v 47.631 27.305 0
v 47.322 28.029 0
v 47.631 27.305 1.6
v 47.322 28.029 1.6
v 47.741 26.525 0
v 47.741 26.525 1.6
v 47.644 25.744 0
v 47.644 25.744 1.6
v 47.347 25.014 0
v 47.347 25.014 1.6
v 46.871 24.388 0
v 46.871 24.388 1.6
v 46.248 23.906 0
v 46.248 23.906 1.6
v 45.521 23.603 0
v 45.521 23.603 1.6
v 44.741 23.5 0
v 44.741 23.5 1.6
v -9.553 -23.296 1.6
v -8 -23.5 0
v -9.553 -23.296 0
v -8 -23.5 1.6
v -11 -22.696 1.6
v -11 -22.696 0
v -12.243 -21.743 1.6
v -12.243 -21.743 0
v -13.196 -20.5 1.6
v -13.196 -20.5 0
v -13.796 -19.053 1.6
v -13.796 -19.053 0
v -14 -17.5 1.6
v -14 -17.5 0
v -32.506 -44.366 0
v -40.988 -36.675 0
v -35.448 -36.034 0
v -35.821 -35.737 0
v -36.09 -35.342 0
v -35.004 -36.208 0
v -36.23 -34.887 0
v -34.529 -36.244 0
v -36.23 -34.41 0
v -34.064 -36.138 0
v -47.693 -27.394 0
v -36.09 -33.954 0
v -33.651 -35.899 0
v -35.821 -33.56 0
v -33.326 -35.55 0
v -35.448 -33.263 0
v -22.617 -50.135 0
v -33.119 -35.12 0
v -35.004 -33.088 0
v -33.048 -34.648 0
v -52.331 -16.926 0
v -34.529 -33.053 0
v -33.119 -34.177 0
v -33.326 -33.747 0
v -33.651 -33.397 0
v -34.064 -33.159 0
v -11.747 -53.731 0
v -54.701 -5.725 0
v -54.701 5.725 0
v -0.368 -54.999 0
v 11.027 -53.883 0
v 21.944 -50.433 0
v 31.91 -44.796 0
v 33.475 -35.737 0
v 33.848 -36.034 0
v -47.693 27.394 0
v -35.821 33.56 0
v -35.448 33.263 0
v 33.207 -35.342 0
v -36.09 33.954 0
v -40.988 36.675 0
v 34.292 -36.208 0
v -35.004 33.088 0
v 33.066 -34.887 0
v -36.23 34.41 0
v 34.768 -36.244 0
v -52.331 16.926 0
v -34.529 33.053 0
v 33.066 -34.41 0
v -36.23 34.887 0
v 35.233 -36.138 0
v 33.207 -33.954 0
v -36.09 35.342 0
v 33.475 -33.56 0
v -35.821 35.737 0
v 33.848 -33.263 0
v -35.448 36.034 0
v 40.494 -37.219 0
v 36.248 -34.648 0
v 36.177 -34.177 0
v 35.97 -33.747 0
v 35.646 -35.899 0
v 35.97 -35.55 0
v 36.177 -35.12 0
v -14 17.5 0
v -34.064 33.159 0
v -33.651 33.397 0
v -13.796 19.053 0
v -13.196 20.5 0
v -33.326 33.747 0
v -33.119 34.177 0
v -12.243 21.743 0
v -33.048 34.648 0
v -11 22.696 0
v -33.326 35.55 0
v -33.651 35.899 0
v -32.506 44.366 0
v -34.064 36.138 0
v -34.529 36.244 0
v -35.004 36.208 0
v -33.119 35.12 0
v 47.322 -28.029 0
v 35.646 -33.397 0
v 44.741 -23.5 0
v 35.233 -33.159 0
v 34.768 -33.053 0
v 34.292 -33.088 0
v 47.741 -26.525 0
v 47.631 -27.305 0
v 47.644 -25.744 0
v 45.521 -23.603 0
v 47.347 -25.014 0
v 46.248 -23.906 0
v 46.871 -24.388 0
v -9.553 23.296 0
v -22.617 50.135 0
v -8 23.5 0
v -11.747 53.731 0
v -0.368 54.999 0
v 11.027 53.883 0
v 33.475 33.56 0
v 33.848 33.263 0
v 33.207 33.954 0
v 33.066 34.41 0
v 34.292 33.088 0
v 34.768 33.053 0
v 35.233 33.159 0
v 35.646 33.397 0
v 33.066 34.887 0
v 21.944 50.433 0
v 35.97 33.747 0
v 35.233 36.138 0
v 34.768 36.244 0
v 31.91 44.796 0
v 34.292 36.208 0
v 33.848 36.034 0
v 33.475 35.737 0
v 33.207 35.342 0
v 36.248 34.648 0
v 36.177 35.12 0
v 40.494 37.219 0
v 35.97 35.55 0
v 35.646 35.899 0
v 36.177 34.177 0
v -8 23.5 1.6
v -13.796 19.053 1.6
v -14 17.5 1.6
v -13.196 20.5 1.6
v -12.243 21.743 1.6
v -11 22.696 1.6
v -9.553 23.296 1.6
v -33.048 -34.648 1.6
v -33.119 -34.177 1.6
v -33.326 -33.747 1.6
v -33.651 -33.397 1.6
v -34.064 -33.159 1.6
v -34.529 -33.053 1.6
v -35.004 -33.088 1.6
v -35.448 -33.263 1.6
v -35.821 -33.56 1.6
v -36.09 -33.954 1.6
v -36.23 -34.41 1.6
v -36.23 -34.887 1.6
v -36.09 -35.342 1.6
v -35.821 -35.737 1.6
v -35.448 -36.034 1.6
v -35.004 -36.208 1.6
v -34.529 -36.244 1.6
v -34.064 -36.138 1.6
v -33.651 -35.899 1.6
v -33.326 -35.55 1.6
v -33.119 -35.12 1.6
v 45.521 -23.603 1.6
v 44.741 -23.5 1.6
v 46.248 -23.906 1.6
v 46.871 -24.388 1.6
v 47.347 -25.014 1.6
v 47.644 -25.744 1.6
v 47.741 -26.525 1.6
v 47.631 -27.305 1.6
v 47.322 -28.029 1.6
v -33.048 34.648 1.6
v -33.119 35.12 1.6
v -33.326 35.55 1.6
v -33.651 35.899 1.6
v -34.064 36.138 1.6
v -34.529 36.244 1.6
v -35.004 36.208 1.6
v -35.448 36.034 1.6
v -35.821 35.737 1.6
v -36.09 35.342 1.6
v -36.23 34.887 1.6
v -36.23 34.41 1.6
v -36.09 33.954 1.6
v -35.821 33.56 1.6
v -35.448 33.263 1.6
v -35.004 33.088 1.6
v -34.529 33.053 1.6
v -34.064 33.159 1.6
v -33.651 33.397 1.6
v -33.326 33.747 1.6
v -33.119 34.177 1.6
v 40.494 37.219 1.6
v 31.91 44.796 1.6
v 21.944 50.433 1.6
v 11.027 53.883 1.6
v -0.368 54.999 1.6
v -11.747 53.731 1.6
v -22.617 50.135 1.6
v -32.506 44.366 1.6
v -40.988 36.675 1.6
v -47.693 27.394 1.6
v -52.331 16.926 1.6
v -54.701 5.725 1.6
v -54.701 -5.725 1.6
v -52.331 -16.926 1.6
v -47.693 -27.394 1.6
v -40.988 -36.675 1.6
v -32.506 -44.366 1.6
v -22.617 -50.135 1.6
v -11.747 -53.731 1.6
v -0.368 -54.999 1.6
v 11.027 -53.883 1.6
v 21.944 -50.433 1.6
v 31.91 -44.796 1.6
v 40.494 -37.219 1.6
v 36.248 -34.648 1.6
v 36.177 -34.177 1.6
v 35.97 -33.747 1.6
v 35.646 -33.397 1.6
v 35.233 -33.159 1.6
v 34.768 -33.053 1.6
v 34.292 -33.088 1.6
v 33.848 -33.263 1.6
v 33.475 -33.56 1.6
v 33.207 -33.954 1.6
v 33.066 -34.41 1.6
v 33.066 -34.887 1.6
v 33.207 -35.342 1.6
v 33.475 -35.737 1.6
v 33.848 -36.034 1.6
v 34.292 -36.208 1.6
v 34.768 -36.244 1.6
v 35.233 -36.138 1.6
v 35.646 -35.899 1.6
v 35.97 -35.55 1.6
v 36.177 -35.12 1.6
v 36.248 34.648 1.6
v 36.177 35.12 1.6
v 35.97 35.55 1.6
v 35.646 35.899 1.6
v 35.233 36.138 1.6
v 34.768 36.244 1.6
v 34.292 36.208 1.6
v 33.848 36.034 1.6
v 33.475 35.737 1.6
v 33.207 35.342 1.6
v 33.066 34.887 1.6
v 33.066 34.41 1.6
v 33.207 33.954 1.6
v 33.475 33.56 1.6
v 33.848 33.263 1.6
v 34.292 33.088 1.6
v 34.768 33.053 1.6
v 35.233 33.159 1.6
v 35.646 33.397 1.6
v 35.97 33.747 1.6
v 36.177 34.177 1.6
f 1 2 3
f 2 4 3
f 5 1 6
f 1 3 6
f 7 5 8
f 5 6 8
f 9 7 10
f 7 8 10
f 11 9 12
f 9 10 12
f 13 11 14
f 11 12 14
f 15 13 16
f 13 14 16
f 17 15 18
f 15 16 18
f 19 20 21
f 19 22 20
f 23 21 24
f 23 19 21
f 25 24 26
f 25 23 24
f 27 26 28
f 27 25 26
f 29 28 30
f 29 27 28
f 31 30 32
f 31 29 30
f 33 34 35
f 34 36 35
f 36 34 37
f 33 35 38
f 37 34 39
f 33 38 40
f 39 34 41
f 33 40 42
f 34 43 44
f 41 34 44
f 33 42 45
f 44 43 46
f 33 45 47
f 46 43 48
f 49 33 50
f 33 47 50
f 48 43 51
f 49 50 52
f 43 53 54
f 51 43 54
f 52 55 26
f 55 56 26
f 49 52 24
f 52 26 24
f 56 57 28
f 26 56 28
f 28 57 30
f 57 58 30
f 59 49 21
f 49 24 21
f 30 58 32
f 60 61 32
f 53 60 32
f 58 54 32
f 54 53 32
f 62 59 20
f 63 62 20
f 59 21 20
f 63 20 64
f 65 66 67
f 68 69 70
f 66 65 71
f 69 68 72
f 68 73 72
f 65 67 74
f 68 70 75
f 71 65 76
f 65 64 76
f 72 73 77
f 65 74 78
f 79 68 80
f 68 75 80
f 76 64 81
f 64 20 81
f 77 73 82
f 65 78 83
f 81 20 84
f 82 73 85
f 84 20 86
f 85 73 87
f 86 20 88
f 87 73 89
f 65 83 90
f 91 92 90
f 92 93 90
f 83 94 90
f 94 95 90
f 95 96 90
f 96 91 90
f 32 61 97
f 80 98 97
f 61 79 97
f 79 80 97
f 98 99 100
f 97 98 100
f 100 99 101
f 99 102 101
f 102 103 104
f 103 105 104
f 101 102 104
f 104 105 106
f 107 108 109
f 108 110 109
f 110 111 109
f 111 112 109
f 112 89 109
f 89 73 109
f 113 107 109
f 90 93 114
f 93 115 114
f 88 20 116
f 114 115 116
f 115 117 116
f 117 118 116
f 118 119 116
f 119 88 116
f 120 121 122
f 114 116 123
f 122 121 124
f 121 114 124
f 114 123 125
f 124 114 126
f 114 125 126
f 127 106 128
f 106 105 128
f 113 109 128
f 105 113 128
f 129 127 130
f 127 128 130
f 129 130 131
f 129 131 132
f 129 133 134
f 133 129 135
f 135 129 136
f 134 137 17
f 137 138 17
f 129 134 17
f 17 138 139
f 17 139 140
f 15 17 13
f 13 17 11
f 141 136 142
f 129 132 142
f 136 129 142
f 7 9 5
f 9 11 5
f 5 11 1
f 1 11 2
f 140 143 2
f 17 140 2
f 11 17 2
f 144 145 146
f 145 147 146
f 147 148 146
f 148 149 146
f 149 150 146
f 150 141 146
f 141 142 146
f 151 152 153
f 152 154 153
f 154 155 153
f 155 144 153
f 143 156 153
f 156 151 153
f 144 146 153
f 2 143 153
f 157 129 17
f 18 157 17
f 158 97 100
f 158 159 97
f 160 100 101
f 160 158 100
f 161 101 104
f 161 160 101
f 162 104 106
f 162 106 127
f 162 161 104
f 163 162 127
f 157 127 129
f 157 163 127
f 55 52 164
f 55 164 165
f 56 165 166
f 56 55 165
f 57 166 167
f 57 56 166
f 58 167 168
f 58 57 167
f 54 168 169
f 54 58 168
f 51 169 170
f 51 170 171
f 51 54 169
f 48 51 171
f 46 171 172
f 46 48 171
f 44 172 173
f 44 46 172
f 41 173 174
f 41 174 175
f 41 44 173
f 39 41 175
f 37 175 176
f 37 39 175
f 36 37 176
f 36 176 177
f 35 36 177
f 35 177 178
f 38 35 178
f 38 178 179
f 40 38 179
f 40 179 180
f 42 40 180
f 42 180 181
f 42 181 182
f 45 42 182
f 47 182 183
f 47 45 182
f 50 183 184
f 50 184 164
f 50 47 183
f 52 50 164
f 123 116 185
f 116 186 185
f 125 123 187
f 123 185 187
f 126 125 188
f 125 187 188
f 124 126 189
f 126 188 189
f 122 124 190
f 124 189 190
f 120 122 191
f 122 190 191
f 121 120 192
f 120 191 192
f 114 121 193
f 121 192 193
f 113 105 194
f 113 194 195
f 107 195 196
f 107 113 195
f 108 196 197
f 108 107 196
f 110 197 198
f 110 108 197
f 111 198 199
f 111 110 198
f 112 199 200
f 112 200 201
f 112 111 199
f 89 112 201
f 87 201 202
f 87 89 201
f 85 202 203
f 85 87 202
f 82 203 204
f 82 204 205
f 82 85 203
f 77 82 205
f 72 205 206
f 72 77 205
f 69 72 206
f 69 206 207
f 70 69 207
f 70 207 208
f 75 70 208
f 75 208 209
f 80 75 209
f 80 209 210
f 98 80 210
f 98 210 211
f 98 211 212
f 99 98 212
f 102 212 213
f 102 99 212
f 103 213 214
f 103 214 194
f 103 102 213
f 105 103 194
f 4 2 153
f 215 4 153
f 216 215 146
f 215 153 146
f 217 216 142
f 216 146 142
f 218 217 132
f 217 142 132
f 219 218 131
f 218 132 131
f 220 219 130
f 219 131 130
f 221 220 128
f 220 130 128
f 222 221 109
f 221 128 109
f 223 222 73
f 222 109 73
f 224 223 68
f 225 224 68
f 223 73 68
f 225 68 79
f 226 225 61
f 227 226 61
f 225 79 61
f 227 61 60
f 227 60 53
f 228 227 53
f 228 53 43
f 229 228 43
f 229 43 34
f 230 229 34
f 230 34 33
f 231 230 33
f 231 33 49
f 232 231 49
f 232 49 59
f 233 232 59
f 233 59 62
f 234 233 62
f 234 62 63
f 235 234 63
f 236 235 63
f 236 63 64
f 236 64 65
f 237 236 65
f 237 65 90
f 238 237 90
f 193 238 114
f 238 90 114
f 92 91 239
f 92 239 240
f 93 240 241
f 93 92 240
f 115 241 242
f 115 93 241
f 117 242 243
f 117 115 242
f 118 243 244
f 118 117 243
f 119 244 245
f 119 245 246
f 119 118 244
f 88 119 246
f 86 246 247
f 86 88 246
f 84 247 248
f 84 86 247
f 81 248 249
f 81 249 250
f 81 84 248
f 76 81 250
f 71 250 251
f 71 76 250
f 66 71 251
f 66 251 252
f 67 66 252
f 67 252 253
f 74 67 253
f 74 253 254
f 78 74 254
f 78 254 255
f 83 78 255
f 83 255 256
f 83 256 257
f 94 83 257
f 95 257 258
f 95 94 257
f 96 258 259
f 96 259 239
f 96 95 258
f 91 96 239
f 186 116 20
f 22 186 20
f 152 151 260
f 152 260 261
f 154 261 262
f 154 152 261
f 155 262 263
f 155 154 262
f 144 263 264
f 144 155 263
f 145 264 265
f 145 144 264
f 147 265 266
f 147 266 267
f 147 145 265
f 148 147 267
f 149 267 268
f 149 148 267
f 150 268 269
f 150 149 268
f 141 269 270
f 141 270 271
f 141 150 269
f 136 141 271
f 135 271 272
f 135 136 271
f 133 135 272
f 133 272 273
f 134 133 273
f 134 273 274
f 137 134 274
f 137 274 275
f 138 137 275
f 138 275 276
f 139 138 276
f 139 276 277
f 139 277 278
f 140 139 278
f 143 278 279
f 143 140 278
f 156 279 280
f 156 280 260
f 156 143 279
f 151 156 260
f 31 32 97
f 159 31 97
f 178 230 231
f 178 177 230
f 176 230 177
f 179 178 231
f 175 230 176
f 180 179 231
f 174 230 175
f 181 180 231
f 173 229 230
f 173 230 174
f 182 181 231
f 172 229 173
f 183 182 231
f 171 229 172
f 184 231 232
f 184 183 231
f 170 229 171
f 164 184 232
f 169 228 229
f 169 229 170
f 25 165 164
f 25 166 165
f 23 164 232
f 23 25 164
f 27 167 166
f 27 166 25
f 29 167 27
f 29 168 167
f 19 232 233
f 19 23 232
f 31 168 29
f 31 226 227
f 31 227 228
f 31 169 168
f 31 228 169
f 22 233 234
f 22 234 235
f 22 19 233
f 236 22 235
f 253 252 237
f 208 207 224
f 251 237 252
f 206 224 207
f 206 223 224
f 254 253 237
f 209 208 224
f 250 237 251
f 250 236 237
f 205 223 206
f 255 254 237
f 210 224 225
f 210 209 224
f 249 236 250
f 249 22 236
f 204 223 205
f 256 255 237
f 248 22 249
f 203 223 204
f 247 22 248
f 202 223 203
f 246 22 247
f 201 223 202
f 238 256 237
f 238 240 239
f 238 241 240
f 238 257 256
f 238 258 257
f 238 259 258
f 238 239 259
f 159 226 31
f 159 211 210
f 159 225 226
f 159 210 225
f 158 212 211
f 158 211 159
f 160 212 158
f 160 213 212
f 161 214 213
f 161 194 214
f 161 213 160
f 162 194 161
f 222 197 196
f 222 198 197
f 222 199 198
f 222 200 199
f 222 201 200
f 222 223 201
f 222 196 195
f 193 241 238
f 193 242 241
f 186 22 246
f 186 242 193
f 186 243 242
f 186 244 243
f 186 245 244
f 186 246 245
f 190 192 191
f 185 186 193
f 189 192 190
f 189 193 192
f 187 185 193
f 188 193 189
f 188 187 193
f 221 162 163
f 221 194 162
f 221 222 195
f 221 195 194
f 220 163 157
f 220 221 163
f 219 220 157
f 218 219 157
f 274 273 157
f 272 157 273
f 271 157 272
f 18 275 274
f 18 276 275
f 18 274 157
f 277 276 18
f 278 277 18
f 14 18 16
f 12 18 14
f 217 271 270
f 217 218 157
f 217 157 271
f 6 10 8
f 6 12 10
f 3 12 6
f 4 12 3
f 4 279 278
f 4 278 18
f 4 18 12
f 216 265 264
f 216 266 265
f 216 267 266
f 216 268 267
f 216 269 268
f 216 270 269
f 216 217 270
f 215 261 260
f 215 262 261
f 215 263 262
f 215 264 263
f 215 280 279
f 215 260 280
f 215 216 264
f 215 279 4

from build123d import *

# Parameters (mm, degrees)
SKETCH_1_R      = 1.6
EXTRUDE_1_DEPTH = 1.6
FILLET_1_R      = 6
FILLET_2_R      = 3


with BuildPart() as part:
    # 草圖1 → 填料-伸長1 (new body)
    with BuildSketch(Plane.XY):
        with BuildLine():
            Line((49.726753363, -23.5), (-14, -23.5))
            Line((-14, -23.5), (-14, 23.5))
            Line((-14, 23.5), (49.726753363, 23.5))
            ThreePointArc((49.726753363, 23.5), (-55, 0), (49.726753363, -23.5))
        make_face()
        with Locations((34.648232278, 34.648232278)):
            Circle(SKETCH_1_R, mode=Mode.SUBTRACT)
        with Locations((-34.648232278, 34.648232278)):
            Circle(SKETCH_1_R, mode=Mode.SUBTRACT)
        with Locations((-34.648232278, -34.648232278)):
            Circle(SKETCH_1_R, mode=Mode.SUBTRACT)
        with Locations((34.648232278, -34.648232278)):
            Circle(SKETCH_1_R, mode=Mode.SUBTRACT)
    extrude(amount=EXTRUDE_1_DEPTH)

    # 圓角1
    fillet_1_edges = [part.edges().sort_by_distance(p)[0] for p in [
        (-14, 23.5, 0.8),
        (-14, -23.5, 0.8),
    ]]
    fillet(fillet_1_edges, radius=FILLET_1_R)

    # 圓角2
    fillet_2_edges = [part.edges().sort_by_distance(p)[0] for p in [
        (49.726753363, 23.5, 0.8),
        (49.726753363, -23.5, 0.8),
    ]]
    fillet(fillet_2_edges, radius=FILLET_2_R)


solid = part.part
